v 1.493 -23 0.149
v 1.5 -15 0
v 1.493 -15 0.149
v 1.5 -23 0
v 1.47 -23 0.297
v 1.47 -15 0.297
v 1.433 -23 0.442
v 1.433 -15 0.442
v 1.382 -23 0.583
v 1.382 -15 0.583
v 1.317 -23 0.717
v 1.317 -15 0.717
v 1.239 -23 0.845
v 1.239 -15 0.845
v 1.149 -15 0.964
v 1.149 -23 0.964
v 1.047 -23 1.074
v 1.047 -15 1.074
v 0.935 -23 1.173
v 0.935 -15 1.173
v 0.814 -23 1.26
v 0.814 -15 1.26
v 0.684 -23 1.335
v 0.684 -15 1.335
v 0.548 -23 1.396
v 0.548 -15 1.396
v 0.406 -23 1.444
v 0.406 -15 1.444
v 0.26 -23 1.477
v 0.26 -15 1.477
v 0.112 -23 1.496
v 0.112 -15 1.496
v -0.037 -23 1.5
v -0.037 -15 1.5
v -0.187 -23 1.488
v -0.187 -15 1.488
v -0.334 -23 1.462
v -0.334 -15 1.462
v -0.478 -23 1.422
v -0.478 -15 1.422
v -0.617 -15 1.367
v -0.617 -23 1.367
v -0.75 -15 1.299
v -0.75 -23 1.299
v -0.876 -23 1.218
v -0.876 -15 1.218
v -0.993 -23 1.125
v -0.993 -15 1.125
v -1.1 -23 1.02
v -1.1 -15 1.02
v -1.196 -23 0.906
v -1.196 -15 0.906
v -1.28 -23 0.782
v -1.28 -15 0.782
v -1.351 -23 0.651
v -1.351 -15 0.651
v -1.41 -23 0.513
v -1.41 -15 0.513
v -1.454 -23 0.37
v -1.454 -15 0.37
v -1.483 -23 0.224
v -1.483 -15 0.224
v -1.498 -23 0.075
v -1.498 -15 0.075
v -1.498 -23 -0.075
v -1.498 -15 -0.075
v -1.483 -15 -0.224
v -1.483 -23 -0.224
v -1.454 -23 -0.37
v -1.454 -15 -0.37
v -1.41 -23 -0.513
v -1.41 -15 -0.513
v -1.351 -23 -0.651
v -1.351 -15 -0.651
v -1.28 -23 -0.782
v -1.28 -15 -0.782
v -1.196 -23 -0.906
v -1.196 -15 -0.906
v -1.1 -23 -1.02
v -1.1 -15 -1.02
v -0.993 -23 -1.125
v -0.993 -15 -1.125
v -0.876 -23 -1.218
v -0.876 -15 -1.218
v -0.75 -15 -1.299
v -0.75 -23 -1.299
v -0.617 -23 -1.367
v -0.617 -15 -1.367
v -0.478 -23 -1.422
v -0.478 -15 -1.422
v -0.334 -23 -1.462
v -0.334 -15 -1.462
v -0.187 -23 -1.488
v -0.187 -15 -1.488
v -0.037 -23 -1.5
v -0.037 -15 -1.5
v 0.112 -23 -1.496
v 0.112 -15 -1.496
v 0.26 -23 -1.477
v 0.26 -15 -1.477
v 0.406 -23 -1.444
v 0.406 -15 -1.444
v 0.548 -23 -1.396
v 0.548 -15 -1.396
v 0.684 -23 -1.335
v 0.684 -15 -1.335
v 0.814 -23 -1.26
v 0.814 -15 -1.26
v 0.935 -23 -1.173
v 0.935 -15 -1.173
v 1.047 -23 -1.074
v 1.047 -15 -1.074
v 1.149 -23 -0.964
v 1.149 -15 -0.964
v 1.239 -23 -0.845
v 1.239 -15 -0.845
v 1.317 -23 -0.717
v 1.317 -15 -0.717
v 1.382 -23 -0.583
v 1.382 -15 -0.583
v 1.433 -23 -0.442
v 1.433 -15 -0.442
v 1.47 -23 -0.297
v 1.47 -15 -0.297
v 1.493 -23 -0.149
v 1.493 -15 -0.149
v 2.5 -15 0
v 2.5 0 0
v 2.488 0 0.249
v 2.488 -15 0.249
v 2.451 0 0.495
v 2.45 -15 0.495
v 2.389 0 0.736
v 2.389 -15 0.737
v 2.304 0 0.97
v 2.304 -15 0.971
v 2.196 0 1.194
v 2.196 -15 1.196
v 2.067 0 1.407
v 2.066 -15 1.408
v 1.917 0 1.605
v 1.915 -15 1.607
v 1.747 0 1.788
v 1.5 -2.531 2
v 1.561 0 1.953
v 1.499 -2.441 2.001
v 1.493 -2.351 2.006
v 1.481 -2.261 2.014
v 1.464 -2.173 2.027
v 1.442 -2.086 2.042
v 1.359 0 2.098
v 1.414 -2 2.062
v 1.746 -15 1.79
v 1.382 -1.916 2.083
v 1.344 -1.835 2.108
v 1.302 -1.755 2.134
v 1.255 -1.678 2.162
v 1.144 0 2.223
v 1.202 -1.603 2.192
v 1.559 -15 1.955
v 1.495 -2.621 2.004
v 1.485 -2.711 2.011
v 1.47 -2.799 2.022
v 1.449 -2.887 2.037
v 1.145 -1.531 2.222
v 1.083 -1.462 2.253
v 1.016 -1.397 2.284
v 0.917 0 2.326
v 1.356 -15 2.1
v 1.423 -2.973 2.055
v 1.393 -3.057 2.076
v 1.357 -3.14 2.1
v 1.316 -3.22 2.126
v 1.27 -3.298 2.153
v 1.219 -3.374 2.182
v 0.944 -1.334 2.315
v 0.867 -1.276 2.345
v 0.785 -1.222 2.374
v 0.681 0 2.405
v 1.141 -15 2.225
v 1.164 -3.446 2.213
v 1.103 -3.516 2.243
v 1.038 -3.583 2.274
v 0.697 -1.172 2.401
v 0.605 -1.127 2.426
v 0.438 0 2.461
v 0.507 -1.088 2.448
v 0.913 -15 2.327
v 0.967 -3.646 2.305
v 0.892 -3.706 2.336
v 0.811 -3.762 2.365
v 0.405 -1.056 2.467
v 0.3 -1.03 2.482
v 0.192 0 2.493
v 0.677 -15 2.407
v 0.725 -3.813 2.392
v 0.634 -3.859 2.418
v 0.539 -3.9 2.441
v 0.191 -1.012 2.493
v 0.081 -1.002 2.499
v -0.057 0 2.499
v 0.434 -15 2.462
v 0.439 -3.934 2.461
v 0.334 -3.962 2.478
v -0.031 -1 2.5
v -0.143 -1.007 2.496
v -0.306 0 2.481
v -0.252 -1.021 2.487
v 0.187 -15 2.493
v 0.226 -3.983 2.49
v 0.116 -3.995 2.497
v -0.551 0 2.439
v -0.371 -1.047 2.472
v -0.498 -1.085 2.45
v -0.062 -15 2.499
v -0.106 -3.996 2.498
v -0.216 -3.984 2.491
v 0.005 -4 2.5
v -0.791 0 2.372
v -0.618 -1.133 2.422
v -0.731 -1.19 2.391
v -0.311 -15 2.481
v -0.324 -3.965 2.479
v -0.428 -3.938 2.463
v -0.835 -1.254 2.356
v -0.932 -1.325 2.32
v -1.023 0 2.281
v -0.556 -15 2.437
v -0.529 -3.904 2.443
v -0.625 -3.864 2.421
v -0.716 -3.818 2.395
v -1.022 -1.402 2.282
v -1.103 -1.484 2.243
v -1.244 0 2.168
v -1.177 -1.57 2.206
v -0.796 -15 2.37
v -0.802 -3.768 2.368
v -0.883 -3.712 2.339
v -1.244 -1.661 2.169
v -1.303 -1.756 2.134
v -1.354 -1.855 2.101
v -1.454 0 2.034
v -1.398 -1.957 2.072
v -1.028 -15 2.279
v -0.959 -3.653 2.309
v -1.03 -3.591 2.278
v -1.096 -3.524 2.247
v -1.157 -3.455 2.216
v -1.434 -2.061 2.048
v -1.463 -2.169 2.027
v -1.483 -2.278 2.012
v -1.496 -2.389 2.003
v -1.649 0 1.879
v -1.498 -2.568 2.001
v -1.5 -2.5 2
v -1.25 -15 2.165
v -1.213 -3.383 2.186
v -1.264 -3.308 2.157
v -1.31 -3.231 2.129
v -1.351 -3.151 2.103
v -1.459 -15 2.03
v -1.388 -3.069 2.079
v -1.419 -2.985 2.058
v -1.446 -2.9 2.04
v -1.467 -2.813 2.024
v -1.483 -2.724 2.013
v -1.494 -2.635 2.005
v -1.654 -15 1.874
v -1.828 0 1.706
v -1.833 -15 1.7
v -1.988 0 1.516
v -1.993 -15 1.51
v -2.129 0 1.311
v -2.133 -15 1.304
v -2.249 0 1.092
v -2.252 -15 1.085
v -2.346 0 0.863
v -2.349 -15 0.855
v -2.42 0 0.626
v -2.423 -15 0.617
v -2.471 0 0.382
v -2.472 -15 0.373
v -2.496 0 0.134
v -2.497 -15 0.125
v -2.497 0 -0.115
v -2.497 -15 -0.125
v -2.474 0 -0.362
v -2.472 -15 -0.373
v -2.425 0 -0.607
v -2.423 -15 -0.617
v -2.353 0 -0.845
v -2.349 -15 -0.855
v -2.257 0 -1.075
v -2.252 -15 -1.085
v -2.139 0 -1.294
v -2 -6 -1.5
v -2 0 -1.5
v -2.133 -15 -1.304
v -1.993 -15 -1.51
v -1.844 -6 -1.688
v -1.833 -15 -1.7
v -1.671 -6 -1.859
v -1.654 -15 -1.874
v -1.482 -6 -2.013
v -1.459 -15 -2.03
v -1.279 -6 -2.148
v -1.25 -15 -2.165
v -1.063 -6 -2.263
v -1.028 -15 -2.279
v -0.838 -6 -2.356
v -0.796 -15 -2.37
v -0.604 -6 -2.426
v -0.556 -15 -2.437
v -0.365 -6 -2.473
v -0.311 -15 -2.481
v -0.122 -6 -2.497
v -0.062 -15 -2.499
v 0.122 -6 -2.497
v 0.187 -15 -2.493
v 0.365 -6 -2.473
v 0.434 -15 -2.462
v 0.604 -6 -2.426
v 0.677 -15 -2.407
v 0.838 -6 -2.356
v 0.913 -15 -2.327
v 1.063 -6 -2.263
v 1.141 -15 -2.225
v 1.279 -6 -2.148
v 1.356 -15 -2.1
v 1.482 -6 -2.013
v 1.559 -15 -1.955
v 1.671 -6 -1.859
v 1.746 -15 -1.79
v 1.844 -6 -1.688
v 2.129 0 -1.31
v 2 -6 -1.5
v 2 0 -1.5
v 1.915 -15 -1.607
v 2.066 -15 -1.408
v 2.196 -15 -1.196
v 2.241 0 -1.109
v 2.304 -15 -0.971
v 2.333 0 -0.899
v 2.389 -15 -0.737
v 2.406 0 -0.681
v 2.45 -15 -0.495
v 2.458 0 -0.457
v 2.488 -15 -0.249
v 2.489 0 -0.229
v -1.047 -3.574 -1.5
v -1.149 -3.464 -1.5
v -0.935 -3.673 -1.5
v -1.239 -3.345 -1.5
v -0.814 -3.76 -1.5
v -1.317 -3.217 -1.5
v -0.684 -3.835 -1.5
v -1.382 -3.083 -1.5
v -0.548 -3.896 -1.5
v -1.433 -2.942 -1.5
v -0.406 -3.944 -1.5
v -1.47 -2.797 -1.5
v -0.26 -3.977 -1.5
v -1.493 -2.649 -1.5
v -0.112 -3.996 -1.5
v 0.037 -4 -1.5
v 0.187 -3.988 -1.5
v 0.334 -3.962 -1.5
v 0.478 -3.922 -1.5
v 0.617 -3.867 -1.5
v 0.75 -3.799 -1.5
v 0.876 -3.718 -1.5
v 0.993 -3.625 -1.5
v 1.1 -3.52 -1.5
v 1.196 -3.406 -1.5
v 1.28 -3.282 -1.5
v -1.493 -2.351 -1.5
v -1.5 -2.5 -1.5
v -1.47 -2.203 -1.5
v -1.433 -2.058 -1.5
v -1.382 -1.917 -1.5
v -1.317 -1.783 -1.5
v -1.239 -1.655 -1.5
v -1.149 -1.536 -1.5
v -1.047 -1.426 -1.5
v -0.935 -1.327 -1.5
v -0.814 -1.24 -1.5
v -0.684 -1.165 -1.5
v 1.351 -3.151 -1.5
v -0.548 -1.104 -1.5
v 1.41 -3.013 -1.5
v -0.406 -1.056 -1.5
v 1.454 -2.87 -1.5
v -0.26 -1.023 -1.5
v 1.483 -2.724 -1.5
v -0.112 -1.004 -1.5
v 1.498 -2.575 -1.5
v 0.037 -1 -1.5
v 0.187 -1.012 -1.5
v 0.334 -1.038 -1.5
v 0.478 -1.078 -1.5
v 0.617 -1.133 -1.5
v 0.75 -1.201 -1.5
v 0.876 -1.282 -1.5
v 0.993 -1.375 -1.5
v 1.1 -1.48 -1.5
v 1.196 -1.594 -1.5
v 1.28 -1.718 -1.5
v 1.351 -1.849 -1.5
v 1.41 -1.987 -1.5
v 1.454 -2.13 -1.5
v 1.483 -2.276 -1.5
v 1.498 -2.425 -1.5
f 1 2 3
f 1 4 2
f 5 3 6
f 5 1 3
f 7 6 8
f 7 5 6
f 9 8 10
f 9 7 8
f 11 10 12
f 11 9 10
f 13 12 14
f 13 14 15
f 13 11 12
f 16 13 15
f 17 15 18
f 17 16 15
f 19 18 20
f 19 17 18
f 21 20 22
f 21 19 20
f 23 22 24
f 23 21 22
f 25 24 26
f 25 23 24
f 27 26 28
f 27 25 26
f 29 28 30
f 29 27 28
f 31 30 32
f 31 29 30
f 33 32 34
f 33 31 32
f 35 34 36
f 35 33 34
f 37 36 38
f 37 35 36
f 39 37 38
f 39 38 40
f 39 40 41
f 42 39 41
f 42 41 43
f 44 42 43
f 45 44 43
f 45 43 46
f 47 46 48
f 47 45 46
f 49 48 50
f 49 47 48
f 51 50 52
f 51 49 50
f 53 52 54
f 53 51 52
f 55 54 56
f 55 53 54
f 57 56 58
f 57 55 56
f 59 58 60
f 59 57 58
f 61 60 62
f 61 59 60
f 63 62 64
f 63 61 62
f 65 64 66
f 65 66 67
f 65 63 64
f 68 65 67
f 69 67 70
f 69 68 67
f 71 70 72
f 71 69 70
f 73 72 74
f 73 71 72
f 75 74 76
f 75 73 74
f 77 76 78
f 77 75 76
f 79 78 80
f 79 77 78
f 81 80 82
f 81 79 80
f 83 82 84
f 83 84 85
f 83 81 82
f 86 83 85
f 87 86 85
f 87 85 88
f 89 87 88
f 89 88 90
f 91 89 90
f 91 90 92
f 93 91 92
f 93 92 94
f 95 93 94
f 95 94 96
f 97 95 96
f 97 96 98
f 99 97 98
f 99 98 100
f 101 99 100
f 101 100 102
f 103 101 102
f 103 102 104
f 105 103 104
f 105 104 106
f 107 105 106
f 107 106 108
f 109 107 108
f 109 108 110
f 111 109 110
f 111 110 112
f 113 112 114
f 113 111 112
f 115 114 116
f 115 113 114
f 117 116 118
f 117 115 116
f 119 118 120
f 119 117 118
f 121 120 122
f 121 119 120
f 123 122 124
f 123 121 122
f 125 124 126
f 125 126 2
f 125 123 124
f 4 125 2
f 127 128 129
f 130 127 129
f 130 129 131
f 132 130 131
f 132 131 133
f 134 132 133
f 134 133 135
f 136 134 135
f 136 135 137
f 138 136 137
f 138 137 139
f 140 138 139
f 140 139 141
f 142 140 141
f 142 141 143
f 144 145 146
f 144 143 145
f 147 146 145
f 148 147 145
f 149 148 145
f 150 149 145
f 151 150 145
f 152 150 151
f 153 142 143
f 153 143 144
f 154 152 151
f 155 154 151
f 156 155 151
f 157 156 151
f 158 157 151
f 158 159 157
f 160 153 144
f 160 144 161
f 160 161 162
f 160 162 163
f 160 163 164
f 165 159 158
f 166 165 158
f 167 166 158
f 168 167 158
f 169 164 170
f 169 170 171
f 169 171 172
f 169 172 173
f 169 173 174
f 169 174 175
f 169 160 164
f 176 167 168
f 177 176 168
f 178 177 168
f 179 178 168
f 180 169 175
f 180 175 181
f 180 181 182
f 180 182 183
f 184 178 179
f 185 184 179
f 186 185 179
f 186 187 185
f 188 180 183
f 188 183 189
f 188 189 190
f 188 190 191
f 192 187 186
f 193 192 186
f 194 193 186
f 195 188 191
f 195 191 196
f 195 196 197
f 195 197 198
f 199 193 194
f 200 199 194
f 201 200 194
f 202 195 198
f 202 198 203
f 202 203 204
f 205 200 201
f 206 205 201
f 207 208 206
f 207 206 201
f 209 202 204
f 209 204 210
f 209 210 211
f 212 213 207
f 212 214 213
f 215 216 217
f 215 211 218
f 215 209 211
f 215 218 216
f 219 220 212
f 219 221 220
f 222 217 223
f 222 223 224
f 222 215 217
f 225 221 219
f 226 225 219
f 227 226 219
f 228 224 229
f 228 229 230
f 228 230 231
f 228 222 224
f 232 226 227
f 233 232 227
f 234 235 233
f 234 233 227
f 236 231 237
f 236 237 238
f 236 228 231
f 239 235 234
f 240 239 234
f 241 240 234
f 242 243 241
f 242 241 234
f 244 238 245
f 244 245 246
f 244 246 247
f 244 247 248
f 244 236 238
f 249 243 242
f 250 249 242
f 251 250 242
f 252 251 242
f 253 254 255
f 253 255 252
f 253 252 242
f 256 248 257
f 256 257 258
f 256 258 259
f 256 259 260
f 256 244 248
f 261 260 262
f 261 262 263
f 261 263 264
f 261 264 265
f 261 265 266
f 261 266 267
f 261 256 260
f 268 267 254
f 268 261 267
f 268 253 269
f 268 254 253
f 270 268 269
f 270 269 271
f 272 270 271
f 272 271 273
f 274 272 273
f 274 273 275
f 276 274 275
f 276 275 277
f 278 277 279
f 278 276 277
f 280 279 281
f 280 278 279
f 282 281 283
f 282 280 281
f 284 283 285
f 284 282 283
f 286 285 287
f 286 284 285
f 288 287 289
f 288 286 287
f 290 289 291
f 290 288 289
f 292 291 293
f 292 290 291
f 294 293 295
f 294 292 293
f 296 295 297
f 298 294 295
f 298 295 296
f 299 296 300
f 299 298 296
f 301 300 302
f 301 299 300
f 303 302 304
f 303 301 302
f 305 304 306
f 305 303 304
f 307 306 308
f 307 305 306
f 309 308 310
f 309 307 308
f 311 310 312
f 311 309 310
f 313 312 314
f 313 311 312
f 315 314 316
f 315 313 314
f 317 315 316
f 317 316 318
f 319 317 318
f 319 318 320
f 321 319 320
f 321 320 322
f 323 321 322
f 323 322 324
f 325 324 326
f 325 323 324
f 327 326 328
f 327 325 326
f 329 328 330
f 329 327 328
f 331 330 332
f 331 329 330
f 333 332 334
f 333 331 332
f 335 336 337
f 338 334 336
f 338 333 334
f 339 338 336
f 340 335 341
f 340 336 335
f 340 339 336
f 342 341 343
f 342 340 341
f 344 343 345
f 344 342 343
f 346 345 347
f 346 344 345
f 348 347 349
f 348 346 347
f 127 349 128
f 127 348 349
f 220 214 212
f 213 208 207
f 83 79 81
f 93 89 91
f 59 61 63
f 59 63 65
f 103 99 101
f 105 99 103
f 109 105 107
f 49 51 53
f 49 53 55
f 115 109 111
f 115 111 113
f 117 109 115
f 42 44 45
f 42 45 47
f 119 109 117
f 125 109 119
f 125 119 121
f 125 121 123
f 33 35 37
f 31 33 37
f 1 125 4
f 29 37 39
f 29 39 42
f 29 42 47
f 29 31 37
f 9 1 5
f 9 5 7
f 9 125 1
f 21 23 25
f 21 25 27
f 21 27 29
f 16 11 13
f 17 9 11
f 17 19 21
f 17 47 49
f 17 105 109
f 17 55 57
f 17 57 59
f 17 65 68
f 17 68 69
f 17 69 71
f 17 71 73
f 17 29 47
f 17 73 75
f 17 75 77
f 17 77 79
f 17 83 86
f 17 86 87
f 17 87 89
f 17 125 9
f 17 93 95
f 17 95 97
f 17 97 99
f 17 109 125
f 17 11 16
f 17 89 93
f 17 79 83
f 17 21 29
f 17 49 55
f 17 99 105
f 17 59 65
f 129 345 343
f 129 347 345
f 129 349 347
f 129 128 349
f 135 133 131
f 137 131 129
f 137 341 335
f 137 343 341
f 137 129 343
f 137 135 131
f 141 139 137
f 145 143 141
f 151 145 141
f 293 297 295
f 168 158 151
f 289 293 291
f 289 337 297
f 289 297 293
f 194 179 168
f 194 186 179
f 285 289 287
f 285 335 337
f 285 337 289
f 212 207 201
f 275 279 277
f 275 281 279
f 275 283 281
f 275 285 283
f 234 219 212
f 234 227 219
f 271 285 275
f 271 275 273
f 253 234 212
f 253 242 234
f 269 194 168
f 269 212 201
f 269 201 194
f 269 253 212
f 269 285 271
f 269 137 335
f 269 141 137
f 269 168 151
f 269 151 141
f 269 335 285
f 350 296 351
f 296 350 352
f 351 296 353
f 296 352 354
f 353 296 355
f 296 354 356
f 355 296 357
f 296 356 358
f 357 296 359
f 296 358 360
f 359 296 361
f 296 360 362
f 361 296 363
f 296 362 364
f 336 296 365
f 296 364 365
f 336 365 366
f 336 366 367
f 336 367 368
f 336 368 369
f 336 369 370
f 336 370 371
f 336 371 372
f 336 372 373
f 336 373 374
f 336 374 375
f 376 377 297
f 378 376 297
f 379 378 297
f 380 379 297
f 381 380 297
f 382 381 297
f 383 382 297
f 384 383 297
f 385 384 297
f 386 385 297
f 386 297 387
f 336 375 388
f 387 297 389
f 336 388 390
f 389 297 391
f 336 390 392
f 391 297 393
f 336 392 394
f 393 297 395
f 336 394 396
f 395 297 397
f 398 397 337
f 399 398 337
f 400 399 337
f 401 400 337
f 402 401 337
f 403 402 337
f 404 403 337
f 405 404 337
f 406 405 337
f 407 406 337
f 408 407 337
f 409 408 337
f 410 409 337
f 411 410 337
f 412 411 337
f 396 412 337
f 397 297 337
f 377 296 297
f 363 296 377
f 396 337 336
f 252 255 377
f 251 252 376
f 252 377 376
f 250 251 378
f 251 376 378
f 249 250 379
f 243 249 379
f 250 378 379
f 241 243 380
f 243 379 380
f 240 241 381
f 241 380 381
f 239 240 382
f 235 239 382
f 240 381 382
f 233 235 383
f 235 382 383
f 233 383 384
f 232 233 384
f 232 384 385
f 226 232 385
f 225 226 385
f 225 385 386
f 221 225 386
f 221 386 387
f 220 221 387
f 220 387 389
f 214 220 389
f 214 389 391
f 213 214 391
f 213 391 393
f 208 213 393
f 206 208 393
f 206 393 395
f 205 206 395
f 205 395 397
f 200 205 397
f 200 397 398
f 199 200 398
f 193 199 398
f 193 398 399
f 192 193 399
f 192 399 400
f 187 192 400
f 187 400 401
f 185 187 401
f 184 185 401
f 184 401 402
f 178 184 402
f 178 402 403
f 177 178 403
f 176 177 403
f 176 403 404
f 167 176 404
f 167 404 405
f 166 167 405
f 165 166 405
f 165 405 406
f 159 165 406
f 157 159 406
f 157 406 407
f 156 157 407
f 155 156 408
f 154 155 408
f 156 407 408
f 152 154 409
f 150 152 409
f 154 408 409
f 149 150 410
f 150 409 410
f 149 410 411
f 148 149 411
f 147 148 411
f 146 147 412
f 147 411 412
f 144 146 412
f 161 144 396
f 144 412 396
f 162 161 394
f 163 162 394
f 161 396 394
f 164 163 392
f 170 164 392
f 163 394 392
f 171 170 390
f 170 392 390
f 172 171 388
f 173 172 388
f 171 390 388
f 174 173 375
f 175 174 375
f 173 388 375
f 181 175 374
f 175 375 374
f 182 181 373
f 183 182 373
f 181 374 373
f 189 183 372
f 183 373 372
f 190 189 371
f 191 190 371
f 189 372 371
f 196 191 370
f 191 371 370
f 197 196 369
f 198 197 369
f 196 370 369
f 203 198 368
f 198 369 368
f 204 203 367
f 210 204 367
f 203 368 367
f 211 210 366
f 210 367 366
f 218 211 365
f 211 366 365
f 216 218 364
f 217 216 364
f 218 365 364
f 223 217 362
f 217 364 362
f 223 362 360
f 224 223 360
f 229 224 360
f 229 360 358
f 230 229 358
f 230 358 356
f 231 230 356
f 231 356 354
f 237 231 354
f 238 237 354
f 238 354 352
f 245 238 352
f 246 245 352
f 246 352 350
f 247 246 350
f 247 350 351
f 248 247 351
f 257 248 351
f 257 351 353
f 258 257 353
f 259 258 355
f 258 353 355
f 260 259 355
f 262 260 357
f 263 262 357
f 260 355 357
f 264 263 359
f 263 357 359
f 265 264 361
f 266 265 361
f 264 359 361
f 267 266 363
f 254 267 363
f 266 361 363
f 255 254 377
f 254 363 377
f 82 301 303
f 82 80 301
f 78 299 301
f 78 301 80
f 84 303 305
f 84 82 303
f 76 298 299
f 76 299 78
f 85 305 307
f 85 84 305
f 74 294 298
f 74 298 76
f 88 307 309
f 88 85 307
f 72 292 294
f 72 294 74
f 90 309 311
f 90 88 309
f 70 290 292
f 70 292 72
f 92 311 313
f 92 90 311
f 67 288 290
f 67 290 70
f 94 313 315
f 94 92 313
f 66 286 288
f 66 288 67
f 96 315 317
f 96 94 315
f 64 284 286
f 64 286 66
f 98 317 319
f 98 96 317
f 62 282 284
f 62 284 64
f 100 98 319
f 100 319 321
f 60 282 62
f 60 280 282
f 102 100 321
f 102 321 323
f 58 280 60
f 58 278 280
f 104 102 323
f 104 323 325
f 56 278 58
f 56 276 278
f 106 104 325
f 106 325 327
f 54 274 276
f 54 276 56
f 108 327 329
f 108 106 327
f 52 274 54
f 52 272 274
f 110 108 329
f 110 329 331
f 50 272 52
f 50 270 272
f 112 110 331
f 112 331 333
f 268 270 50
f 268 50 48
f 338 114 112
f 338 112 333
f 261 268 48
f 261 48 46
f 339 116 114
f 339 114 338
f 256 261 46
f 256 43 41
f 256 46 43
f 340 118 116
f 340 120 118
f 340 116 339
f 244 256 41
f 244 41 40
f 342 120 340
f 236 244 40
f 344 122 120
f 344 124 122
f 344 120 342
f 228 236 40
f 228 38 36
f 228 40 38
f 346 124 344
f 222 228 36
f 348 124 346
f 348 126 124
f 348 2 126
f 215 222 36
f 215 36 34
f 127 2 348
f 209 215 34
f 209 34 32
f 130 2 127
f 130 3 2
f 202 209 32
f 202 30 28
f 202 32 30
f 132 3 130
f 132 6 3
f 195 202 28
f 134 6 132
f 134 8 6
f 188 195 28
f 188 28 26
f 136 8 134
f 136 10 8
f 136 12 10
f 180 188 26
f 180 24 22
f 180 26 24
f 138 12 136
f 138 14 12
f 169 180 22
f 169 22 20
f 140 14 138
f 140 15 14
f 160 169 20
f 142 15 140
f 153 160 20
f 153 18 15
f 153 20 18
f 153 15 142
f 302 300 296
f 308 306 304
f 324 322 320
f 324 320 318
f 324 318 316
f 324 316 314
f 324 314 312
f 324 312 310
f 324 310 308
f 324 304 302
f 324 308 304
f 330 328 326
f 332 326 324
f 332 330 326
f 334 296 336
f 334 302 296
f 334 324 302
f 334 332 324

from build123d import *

# Parameters (mm, degrees)
CUT_EXTRUDE_1_DEPTH = 6
SKETCH_3_R          = 1.5
CUT_EXTRUDE_2_DEPTH = 5


with BuildPart() as part:
    # 草图1 → 旋转1 (revolve)
    with BuildSketch(Plane.XY):
        Polygon((0, 0), (2.5, 0), (2.5, -15), (1.5, -15), (1.5, -23), (0, -23), align=None)
    revolve(axis=Axis((0, 9.186035128, 0), (0, -1, 0)))

    # 草图2 → 切除-拉伸1 (cut)
    with BuildSketch(Plane(origin=(0, 0, 0), x_dir=(1, 0, 0), z_dir=(0, 1, 0))):
        with BuildLine():
            Line((-2, 1.5), (2, 1.5))
            ThreePointArc((2, 1.5), (0, 2.5), (-2, 1.5))
        make_face()
    extrude(amount=-CUT_EXTRUDE_1_DEPTH, mode=Mode.SUBTRACT)

    # 草图3 → 切除-拉伸2 (cut, through all)
    with BuildSketch(Plane(origin=(0, 0, -1.5), x_dir=(-1, 0, 0), z_dir=(0, 0, -1))):
        with Locations((0, -2.5)):
            Circle(SKETCH_3_R)
    extrude(amount=-CUT_EXTRUDE_2_DEPTH, mode=Mode.SUBTRACT)


solid = part.part
